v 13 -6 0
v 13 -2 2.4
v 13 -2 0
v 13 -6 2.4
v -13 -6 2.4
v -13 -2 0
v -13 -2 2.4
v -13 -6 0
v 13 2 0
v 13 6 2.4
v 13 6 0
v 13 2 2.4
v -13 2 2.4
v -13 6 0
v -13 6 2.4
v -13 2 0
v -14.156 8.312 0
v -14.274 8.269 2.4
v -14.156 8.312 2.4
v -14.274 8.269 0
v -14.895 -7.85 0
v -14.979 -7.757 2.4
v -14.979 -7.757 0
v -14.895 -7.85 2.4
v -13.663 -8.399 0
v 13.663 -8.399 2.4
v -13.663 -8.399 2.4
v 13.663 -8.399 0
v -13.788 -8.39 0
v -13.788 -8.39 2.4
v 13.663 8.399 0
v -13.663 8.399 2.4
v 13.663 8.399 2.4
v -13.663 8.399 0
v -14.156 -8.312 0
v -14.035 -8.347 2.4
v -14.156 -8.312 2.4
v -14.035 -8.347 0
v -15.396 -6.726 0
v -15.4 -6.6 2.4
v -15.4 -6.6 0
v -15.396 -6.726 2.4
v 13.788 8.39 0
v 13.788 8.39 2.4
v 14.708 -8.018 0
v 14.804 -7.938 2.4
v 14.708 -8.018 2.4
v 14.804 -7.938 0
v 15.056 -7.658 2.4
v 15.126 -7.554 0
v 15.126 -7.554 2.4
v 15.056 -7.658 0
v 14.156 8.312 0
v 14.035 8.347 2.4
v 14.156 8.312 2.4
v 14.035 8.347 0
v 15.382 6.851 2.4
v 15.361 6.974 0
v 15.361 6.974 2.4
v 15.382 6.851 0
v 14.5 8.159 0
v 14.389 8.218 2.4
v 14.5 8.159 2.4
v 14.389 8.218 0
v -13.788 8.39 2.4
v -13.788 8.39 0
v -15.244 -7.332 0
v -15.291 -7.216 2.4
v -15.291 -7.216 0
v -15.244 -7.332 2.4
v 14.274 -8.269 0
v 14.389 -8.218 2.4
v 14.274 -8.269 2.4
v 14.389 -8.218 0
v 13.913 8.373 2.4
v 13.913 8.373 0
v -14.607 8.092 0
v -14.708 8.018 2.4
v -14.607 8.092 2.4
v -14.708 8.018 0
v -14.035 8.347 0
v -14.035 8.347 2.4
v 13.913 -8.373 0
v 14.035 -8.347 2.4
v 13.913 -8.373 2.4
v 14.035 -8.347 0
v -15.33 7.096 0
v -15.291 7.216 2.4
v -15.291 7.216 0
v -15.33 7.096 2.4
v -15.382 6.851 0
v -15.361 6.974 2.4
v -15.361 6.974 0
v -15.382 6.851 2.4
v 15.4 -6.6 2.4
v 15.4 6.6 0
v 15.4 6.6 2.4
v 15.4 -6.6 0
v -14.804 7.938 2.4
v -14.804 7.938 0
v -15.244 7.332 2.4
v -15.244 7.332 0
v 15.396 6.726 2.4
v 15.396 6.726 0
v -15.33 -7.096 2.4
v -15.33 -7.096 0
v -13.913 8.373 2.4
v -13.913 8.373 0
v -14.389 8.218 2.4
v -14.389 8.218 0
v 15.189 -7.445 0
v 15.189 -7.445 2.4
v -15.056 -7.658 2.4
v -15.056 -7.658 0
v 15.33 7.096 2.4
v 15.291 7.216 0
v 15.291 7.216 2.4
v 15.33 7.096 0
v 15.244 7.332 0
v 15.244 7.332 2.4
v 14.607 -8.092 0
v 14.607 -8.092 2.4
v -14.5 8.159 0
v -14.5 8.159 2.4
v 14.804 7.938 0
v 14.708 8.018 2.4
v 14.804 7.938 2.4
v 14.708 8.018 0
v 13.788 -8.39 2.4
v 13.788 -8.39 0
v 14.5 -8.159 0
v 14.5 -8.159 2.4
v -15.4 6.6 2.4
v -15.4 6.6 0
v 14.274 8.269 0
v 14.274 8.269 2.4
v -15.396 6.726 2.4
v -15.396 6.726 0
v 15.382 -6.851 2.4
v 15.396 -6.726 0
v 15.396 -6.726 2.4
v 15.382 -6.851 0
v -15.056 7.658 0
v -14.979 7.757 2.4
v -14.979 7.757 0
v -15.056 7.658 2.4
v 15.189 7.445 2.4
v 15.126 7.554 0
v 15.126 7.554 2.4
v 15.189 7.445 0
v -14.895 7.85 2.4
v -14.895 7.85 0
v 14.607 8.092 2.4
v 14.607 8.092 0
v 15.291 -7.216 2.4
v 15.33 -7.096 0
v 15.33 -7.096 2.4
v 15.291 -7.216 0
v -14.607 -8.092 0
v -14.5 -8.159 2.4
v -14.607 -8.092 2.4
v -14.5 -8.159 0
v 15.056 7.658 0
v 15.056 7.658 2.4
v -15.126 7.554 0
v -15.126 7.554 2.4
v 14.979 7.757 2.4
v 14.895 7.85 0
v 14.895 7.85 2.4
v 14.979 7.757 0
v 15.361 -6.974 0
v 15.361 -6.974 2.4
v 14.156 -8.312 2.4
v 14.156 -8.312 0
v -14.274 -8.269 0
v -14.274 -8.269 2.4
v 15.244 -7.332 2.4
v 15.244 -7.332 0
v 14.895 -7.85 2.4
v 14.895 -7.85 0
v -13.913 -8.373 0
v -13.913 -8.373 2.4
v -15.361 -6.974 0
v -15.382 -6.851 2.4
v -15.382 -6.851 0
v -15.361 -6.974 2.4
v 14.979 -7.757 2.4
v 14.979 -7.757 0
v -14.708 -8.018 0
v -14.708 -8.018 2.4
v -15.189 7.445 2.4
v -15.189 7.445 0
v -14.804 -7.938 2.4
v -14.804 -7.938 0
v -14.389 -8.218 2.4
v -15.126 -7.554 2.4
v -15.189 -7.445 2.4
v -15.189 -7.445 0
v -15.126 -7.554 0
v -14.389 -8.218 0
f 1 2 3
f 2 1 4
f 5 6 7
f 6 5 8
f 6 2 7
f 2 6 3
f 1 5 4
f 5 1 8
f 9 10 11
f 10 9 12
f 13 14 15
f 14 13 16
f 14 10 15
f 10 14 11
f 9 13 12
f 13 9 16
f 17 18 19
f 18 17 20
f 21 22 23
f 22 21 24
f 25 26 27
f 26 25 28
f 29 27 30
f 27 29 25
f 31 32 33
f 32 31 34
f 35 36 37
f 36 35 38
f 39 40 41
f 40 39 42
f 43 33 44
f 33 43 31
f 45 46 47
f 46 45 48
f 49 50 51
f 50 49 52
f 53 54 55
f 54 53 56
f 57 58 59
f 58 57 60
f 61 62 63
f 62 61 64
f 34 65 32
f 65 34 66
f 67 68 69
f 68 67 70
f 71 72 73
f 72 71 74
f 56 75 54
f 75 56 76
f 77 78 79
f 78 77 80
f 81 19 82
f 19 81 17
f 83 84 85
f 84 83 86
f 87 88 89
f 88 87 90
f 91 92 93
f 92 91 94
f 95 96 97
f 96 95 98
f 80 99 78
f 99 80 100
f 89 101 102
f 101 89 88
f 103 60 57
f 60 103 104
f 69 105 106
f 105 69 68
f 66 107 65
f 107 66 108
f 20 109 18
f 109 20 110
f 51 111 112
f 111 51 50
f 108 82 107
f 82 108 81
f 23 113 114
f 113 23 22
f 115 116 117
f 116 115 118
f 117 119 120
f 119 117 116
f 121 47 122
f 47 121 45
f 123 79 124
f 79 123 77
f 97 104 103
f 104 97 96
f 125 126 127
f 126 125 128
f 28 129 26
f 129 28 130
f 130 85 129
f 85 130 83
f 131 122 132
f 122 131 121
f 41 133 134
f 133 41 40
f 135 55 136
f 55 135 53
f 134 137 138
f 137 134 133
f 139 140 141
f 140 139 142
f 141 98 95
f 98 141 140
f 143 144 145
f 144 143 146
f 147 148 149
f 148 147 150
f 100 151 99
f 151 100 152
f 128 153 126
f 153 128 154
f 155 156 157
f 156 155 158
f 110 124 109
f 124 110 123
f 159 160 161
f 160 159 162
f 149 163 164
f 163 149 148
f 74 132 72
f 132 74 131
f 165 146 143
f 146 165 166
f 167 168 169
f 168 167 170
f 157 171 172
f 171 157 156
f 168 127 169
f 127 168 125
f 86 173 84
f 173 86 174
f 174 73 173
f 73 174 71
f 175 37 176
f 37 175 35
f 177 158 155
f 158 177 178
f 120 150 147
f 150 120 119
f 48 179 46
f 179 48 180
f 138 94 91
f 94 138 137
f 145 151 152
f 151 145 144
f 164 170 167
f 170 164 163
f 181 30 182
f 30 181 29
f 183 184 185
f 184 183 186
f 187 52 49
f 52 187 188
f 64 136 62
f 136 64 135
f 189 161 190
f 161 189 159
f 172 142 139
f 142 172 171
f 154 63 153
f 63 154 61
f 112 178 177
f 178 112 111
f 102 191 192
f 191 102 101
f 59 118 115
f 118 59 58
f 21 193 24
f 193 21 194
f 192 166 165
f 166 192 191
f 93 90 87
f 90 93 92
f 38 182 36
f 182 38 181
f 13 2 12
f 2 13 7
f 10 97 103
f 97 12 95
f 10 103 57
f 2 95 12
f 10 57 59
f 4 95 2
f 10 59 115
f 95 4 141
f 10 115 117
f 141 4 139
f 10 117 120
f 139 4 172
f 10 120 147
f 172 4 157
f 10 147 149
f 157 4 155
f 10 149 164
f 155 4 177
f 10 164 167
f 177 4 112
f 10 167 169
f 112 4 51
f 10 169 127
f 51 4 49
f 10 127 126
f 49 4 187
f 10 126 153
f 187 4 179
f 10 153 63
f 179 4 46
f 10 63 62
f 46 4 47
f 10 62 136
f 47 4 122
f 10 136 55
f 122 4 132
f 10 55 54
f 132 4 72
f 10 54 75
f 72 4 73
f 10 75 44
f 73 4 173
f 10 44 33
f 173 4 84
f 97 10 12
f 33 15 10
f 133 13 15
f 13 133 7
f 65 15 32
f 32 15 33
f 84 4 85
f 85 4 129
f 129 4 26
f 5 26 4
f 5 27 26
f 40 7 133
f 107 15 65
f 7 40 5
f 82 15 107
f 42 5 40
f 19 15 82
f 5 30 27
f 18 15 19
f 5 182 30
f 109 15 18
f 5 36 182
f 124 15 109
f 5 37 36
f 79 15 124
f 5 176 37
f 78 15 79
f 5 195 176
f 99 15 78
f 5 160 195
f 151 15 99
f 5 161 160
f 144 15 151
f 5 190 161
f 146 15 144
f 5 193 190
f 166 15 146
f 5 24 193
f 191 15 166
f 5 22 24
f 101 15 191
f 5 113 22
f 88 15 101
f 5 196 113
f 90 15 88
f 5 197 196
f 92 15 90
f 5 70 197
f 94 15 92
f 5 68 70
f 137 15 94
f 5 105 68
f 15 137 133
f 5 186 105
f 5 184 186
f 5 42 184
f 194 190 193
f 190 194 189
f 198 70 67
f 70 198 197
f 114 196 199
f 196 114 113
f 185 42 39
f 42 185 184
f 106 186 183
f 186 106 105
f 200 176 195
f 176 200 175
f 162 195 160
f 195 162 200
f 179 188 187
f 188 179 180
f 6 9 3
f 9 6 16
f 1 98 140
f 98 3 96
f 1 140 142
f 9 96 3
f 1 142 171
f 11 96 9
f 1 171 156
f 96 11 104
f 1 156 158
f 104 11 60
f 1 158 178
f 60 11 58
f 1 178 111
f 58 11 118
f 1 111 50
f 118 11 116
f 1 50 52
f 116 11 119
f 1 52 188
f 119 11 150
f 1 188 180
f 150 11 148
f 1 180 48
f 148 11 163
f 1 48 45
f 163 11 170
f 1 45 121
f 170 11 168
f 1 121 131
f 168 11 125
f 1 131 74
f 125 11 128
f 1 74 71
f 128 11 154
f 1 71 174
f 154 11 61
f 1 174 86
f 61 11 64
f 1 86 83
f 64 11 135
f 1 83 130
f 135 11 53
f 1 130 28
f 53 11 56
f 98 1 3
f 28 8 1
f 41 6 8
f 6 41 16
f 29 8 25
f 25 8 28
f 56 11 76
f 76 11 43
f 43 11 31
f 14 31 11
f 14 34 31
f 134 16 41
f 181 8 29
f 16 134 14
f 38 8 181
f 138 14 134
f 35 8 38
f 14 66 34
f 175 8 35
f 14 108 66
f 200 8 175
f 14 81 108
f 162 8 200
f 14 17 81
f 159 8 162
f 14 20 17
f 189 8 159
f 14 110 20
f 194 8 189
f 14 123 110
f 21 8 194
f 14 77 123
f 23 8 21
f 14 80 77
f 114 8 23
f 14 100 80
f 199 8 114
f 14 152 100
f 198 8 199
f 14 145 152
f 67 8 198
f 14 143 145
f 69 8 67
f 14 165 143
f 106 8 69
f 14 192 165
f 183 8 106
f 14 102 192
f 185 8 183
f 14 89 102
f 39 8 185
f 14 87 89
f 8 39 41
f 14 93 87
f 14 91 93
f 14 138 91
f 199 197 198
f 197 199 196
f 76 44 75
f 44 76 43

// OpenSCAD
//=== Flat Tri Glide ===//

//width of the webbing opening (1in = 25.4 mm)
_1_webbingWidth = 26;

// width of the gap for the webbing
_2_webbingGap = 4;

// thickness of the edge
_3_edgeThickness = 2.4;

// thickness of the center beam
_4_centerThickness = 4;

// height of the tri glide
_5_height = 2.4;

// percent corner rounding
_6_cornerRounding = 75; // [1:100]


module makeBody(xsize, ysize, height, radius) {
	translate([0,0,height/2]) {
		minkowski() {
			cube(size=[xsize-2*radius,ysize-2*radius, height/2], center = true);
			cylinder(r=radius, h=height/2, center=true);
		}
	}
}

module makeCuts(width, gap, thickness, height) {
	offset = (thickness+gap)/2;
	for (y = [-offset, offset]) {
		translate([0, y, height/2]) {
			cube(size=[width, gap, height*2], center=true);
		}
	}
}

module makeTriGlide(width, gap, edgeThickness, centerThickness, height, rounding, $fn=90) {
	xsize = width + edgeThickness * 2;
	ysize = centerThickness + edgeThickness * 2 + gap * 2;
	radius = edgeThickness*(rounding/100);
	difference() {
		makeBody(xsize, ysize, height, radius);
		makeCuts(width, gap, centerThickness, height);
	}
}

makeTriGlide(_1_webbingWidth, _2_webbingGap, _3_edgeThickness, _4_centerThickness, _5_height, _6_cornerRounding);
